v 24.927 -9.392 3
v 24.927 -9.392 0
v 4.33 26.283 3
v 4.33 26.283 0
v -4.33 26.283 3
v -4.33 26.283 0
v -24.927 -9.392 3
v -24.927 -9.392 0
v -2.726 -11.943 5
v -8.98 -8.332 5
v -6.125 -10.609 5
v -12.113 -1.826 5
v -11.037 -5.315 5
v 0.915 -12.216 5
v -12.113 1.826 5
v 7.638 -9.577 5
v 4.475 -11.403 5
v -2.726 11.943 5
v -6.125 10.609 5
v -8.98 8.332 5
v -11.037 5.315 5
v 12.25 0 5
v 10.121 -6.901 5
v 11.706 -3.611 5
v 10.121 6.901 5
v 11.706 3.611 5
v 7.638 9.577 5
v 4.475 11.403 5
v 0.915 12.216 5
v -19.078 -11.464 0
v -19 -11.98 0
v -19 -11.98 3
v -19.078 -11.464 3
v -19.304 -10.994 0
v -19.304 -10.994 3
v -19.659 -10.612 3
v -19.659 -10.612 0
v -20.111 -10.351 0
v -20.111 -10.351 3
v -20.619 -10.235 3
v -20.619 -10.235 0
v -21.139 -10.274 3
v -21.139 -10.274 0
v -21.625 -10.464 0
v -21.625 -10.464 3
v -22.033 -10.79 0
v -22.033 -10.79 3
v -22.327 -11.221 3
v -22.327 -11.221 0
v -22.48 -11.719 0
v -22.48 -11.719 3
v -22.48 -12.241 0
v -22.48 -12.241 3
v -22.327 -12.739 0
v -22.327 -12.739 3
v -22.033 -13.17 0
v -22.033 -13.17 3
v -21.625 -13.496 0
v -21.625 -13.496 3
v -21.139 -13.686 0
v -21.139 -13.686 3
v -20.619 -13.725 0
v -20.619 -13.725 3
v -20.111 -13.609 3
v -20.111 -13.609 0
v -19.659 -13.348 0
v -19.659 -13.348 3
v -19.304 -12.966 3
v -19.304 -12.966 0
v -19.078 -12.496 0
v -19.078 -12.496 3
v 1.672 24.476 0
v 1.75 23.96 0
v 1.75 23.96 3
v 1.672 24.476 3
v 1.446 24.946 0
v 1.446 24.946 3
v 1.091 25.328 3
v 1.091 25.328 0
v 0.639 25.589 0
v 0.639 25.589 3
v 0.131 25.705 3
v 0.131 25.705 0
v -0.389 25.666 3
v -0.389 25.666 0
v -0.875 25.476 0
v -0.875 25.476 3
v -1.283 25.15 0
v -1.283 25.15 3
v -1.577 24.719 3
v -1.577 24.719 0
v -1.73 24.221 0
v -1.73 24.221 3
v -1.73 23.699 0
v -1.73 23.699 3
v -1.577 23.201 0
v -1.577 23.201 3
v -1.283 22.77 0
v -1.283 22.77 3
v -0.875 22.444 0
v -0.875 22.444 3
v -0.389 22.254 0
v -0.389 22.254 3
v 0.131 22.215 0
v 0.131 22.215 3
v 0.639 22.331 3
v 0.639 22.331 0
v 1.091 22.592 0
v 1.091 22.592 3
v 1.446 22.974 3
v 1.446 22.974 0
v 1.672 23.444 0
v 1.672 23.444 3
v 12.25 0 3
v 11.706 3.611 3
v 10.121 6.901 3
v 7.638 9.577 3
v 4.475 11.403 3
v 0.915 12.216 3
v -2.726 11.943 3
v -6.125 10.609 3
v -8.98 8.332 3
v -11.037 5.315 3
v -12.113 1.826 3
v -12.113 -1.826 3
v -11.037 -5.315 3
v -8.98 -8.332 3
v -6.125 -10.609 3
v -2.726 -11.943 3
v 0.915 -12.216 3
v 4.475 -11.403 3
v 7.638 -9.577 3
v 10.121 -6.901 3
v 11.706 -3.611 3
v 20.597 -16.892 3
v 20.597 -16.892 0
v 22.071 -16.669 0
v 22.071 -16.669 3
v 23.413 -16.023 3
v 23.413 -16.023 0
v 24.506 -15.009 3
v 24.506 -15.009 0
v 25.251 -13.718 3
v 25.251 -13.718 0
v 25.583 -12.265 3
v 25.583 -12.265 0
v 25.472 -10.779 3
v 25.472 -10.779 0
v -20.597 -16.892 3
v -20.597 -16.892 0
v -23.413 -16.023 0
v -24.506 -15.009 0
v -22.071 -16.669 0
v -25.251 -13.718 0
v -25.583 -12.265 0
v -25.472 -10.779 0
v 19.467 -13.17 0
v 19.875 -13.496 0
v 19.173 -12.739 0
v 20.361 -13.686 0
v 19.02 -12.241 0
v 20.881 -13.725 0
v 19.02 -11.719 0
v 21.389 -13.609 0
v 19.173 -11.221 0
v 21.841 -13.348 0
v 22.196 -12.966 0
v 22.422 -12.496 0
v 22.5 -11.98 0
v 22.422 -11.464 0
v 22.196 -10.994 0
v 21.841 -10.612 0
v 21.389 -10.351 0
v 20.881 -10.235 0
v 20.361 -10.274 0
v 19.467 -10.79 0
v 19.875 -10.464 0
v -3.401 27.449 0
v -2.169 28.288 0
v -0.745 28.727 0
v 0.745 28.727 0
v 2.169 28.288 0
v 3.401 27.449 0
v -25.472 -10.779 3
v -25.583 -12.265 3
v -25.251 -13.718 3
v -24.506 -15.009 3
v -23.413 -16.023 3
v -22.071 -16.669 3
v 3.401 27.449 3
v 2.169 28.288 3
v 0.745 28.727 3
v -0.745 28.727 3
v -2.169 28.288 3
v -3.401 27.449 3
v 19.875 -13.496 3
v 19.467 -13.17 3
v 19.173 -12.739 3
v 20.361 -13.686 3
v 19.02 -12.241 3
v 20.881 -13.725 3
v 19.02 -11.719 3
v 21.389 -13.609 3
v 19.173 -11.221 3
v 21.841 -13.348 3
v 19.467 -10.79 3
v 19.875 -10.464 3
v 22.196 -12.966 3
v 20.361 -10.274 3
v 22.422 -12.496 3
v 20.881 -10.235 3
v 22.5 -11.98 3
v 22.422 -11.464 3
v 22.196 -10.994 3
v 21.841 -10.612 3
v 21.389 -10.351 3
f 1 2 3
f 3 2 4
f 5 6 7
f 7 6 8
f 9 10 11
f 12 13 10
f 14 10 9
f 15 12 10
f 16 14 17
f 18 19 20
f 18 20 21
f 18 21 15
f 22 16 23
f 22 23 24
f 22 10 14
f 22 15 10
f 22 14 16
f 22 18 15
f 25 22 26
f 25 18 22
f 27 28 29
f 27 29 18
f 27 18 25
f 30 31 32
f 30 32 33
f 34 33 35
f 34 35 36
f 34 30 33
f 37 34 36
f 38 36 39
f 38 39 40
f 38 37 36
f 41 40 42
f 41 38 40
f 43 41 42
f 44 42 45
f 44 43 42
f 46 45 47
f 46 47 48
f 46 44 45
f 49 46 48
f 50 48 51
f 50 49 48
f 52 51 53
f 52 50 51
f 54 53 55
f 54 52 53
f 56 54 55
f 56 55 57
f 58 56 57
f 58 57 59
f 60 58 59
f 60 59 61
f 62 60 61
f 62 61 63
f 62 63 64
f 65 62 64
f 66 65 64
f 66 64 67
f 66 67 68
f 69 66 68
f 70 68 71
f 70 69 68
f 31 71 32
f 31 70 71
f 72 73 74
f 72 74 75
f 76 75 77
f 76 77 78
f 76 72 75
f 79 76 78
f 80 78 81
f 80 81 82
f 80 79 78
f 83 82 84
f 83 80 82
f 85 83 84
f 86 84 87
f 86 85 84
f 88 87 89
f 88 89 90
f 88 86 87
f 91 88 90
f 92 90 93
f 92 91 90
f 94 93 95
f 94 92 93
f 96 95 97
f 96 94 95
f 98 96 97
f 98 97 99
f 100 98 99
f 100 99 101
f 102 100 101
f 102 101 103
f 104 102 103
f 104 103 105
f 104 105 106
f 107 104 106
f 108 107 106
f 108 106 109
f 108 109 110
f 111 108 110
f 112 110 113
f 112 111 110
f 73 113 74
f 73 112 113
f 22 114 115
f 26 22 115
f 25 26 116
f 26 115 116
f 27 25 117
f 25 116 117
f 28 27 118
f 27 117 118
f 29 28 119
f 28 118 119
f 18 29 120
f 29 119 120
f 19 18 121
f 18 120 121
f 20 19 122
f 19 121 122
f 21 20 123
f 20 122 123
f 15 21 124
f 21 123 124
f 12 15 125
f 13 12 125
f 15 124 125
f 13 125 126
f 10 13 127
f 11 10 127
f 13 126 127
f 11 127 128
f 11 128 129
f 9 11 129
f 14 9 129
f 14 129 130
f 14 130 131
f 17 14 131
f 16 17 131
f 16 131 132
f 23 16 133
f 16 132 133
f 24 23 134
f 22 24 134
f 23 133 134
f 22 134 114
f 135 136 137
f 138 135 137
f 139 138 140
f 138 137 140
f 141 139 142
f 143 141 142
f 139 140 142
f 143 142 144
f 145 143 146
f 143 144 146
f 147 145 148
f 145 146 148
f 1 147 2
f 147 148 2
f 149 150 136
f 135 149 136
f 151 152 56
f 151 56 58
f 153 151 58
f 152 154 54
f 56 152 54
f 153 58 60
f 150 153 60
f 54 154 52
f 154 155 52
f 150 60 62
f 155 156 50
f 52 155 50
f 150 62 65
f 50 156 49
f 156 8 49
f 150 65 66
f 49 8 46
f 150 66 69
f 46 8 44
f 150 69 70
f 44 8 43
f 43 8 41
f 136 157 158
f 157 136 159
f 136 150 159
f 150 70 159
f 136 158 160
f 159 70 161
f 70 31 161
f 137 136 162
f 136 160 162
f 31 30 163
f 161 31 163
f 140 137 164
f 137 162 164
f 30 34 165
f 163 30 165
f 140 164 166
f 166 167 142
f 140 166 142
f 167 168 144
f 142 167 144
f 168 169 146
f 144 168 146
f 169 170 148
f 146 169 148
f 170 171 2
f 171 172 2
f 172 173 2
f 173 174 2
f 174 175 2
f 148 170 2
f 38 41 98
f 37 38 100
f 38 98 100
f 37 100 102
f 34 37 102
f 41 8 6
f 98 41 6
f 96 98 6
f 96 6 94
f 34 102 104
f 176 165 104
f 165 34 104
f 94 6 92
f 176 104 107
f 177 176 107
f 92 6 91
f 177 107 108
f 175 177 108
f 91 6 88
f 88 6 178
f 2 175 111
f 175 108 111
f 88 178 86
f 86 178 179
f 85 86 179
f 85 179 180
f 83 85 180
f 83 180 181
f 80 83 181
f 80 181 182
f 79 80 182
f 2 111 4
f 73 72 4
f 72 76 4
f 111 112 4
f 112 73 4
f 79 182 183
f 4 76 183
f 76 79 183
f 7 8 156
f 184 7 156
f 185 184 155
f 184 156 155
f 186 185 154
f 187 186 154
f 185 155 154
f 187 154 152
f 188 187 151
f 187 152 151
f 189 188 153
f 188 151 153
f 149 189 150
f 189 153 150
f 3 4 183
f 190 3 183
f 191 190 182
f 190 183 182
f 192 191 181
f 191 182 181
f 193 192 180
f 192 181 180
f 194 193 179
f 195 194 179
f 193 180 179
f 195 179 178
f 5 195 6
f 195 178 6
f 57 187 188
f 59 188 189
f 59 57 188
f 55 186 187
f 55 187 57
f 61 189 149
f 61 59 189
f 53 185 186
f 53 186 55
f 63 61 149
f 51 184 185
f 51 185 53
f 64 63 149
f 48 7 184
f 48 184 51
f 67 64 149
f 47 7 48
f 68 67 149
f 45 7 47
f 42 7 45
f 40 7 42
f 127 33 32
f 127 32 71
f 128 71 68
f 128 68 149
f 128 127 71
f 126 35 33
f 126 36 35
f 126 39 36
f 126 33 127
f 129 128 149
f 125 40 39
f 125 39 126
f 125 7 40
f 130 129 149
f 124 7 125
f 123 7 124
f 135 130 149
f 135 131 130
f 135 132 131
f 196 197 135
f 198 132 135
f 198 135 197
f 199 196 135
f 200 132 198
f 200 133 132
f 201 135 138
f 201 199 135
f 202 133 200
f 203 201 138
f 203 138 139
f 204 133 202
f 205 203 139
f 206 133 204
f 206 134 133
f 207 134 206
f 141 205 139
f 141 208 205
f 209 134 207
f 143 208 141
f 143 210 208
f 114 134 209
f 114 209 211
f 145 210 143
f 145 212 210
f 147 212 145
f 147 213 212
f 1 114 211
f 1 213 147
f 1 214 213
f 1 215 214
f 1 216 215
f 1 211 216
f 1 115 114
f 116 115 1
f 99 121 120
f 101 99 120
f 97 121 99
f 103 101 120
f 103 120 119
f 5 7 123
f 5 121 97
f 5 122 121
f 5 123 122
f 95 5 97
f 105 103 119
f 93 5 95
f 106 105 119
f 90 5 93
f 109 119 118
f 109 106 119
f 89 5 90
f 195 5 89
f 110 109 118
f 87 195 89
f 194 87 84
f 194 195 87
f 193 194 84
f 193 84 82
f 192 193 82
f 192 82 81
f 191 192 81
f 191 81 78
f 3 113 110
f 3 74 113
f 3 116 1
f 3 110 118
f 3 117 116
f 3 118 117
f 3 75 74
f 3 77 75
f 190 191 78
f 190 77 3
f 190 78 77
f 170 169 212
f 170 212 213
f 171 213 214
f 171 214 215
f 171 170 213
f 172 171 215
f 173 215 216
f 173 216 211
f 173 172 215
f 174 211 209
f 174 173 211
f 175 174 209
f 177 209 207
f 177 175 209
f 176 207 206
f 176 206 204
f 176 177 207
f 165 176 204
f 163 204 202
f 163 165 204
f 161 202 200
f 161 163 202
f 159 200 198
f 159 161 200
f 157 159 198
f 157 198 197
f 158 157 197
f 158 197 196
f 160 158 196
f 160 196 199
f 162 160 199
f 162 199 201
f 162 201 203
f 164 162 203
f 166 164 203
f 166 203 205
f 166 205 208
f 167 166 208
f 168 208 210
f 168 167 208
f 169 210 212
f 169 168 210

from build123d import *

# Parameters (mm, degrees)
F0_R     = 1.75
F1_DEPTH = 3
F2_R     = 12.25
F3_DEPTH = 2


with BuildPart() as f1:
    # F0 (on Top) → F1 (new body)
    with BuildSketch(Plane.XY):
        with BuildLine():
            Line((24.927017, -9.39162), (4.330127, 26.283241))
            ThreePointArc((4.330127, 26.283241), (0, 28.783241), (-4.330127, 26.283241))
            Line((-4.330127, 26.283241), (-24.927017, -9.39162))
            ThreePointArc((-24.927017, -9.39162), (-24.927017, -14.39162), (-20.59689, -16.89162))
            Line((-20.59689, -16.89162), (20.59689, -16.89162))
            ThreePointArc((20.59689, -16.89162), (24.927017, -14.39162), (24.927017, -9.39162))
        make_face()
        with Locations((-20.75, -11.980018)):
            Circle(F0_R, mode=Mode.SUBTRACT)
        with Locations((20.75, -11.980018)):
            Circle(F0_R, mode=Mode.SUBTRACT)
        with Locations((0, 23.960036)):
            Circle(F0_R, mode=Mode.SUBTRACT)
    extrude(amount=F1_DEPTH)

    # F2 (on face) → F3 (join)
    with BuildSketch(Plane.XY.offset(3)):
        Circle(F2_R)
    extrude(amount=F3_DEPTH)


solid = f1.part
